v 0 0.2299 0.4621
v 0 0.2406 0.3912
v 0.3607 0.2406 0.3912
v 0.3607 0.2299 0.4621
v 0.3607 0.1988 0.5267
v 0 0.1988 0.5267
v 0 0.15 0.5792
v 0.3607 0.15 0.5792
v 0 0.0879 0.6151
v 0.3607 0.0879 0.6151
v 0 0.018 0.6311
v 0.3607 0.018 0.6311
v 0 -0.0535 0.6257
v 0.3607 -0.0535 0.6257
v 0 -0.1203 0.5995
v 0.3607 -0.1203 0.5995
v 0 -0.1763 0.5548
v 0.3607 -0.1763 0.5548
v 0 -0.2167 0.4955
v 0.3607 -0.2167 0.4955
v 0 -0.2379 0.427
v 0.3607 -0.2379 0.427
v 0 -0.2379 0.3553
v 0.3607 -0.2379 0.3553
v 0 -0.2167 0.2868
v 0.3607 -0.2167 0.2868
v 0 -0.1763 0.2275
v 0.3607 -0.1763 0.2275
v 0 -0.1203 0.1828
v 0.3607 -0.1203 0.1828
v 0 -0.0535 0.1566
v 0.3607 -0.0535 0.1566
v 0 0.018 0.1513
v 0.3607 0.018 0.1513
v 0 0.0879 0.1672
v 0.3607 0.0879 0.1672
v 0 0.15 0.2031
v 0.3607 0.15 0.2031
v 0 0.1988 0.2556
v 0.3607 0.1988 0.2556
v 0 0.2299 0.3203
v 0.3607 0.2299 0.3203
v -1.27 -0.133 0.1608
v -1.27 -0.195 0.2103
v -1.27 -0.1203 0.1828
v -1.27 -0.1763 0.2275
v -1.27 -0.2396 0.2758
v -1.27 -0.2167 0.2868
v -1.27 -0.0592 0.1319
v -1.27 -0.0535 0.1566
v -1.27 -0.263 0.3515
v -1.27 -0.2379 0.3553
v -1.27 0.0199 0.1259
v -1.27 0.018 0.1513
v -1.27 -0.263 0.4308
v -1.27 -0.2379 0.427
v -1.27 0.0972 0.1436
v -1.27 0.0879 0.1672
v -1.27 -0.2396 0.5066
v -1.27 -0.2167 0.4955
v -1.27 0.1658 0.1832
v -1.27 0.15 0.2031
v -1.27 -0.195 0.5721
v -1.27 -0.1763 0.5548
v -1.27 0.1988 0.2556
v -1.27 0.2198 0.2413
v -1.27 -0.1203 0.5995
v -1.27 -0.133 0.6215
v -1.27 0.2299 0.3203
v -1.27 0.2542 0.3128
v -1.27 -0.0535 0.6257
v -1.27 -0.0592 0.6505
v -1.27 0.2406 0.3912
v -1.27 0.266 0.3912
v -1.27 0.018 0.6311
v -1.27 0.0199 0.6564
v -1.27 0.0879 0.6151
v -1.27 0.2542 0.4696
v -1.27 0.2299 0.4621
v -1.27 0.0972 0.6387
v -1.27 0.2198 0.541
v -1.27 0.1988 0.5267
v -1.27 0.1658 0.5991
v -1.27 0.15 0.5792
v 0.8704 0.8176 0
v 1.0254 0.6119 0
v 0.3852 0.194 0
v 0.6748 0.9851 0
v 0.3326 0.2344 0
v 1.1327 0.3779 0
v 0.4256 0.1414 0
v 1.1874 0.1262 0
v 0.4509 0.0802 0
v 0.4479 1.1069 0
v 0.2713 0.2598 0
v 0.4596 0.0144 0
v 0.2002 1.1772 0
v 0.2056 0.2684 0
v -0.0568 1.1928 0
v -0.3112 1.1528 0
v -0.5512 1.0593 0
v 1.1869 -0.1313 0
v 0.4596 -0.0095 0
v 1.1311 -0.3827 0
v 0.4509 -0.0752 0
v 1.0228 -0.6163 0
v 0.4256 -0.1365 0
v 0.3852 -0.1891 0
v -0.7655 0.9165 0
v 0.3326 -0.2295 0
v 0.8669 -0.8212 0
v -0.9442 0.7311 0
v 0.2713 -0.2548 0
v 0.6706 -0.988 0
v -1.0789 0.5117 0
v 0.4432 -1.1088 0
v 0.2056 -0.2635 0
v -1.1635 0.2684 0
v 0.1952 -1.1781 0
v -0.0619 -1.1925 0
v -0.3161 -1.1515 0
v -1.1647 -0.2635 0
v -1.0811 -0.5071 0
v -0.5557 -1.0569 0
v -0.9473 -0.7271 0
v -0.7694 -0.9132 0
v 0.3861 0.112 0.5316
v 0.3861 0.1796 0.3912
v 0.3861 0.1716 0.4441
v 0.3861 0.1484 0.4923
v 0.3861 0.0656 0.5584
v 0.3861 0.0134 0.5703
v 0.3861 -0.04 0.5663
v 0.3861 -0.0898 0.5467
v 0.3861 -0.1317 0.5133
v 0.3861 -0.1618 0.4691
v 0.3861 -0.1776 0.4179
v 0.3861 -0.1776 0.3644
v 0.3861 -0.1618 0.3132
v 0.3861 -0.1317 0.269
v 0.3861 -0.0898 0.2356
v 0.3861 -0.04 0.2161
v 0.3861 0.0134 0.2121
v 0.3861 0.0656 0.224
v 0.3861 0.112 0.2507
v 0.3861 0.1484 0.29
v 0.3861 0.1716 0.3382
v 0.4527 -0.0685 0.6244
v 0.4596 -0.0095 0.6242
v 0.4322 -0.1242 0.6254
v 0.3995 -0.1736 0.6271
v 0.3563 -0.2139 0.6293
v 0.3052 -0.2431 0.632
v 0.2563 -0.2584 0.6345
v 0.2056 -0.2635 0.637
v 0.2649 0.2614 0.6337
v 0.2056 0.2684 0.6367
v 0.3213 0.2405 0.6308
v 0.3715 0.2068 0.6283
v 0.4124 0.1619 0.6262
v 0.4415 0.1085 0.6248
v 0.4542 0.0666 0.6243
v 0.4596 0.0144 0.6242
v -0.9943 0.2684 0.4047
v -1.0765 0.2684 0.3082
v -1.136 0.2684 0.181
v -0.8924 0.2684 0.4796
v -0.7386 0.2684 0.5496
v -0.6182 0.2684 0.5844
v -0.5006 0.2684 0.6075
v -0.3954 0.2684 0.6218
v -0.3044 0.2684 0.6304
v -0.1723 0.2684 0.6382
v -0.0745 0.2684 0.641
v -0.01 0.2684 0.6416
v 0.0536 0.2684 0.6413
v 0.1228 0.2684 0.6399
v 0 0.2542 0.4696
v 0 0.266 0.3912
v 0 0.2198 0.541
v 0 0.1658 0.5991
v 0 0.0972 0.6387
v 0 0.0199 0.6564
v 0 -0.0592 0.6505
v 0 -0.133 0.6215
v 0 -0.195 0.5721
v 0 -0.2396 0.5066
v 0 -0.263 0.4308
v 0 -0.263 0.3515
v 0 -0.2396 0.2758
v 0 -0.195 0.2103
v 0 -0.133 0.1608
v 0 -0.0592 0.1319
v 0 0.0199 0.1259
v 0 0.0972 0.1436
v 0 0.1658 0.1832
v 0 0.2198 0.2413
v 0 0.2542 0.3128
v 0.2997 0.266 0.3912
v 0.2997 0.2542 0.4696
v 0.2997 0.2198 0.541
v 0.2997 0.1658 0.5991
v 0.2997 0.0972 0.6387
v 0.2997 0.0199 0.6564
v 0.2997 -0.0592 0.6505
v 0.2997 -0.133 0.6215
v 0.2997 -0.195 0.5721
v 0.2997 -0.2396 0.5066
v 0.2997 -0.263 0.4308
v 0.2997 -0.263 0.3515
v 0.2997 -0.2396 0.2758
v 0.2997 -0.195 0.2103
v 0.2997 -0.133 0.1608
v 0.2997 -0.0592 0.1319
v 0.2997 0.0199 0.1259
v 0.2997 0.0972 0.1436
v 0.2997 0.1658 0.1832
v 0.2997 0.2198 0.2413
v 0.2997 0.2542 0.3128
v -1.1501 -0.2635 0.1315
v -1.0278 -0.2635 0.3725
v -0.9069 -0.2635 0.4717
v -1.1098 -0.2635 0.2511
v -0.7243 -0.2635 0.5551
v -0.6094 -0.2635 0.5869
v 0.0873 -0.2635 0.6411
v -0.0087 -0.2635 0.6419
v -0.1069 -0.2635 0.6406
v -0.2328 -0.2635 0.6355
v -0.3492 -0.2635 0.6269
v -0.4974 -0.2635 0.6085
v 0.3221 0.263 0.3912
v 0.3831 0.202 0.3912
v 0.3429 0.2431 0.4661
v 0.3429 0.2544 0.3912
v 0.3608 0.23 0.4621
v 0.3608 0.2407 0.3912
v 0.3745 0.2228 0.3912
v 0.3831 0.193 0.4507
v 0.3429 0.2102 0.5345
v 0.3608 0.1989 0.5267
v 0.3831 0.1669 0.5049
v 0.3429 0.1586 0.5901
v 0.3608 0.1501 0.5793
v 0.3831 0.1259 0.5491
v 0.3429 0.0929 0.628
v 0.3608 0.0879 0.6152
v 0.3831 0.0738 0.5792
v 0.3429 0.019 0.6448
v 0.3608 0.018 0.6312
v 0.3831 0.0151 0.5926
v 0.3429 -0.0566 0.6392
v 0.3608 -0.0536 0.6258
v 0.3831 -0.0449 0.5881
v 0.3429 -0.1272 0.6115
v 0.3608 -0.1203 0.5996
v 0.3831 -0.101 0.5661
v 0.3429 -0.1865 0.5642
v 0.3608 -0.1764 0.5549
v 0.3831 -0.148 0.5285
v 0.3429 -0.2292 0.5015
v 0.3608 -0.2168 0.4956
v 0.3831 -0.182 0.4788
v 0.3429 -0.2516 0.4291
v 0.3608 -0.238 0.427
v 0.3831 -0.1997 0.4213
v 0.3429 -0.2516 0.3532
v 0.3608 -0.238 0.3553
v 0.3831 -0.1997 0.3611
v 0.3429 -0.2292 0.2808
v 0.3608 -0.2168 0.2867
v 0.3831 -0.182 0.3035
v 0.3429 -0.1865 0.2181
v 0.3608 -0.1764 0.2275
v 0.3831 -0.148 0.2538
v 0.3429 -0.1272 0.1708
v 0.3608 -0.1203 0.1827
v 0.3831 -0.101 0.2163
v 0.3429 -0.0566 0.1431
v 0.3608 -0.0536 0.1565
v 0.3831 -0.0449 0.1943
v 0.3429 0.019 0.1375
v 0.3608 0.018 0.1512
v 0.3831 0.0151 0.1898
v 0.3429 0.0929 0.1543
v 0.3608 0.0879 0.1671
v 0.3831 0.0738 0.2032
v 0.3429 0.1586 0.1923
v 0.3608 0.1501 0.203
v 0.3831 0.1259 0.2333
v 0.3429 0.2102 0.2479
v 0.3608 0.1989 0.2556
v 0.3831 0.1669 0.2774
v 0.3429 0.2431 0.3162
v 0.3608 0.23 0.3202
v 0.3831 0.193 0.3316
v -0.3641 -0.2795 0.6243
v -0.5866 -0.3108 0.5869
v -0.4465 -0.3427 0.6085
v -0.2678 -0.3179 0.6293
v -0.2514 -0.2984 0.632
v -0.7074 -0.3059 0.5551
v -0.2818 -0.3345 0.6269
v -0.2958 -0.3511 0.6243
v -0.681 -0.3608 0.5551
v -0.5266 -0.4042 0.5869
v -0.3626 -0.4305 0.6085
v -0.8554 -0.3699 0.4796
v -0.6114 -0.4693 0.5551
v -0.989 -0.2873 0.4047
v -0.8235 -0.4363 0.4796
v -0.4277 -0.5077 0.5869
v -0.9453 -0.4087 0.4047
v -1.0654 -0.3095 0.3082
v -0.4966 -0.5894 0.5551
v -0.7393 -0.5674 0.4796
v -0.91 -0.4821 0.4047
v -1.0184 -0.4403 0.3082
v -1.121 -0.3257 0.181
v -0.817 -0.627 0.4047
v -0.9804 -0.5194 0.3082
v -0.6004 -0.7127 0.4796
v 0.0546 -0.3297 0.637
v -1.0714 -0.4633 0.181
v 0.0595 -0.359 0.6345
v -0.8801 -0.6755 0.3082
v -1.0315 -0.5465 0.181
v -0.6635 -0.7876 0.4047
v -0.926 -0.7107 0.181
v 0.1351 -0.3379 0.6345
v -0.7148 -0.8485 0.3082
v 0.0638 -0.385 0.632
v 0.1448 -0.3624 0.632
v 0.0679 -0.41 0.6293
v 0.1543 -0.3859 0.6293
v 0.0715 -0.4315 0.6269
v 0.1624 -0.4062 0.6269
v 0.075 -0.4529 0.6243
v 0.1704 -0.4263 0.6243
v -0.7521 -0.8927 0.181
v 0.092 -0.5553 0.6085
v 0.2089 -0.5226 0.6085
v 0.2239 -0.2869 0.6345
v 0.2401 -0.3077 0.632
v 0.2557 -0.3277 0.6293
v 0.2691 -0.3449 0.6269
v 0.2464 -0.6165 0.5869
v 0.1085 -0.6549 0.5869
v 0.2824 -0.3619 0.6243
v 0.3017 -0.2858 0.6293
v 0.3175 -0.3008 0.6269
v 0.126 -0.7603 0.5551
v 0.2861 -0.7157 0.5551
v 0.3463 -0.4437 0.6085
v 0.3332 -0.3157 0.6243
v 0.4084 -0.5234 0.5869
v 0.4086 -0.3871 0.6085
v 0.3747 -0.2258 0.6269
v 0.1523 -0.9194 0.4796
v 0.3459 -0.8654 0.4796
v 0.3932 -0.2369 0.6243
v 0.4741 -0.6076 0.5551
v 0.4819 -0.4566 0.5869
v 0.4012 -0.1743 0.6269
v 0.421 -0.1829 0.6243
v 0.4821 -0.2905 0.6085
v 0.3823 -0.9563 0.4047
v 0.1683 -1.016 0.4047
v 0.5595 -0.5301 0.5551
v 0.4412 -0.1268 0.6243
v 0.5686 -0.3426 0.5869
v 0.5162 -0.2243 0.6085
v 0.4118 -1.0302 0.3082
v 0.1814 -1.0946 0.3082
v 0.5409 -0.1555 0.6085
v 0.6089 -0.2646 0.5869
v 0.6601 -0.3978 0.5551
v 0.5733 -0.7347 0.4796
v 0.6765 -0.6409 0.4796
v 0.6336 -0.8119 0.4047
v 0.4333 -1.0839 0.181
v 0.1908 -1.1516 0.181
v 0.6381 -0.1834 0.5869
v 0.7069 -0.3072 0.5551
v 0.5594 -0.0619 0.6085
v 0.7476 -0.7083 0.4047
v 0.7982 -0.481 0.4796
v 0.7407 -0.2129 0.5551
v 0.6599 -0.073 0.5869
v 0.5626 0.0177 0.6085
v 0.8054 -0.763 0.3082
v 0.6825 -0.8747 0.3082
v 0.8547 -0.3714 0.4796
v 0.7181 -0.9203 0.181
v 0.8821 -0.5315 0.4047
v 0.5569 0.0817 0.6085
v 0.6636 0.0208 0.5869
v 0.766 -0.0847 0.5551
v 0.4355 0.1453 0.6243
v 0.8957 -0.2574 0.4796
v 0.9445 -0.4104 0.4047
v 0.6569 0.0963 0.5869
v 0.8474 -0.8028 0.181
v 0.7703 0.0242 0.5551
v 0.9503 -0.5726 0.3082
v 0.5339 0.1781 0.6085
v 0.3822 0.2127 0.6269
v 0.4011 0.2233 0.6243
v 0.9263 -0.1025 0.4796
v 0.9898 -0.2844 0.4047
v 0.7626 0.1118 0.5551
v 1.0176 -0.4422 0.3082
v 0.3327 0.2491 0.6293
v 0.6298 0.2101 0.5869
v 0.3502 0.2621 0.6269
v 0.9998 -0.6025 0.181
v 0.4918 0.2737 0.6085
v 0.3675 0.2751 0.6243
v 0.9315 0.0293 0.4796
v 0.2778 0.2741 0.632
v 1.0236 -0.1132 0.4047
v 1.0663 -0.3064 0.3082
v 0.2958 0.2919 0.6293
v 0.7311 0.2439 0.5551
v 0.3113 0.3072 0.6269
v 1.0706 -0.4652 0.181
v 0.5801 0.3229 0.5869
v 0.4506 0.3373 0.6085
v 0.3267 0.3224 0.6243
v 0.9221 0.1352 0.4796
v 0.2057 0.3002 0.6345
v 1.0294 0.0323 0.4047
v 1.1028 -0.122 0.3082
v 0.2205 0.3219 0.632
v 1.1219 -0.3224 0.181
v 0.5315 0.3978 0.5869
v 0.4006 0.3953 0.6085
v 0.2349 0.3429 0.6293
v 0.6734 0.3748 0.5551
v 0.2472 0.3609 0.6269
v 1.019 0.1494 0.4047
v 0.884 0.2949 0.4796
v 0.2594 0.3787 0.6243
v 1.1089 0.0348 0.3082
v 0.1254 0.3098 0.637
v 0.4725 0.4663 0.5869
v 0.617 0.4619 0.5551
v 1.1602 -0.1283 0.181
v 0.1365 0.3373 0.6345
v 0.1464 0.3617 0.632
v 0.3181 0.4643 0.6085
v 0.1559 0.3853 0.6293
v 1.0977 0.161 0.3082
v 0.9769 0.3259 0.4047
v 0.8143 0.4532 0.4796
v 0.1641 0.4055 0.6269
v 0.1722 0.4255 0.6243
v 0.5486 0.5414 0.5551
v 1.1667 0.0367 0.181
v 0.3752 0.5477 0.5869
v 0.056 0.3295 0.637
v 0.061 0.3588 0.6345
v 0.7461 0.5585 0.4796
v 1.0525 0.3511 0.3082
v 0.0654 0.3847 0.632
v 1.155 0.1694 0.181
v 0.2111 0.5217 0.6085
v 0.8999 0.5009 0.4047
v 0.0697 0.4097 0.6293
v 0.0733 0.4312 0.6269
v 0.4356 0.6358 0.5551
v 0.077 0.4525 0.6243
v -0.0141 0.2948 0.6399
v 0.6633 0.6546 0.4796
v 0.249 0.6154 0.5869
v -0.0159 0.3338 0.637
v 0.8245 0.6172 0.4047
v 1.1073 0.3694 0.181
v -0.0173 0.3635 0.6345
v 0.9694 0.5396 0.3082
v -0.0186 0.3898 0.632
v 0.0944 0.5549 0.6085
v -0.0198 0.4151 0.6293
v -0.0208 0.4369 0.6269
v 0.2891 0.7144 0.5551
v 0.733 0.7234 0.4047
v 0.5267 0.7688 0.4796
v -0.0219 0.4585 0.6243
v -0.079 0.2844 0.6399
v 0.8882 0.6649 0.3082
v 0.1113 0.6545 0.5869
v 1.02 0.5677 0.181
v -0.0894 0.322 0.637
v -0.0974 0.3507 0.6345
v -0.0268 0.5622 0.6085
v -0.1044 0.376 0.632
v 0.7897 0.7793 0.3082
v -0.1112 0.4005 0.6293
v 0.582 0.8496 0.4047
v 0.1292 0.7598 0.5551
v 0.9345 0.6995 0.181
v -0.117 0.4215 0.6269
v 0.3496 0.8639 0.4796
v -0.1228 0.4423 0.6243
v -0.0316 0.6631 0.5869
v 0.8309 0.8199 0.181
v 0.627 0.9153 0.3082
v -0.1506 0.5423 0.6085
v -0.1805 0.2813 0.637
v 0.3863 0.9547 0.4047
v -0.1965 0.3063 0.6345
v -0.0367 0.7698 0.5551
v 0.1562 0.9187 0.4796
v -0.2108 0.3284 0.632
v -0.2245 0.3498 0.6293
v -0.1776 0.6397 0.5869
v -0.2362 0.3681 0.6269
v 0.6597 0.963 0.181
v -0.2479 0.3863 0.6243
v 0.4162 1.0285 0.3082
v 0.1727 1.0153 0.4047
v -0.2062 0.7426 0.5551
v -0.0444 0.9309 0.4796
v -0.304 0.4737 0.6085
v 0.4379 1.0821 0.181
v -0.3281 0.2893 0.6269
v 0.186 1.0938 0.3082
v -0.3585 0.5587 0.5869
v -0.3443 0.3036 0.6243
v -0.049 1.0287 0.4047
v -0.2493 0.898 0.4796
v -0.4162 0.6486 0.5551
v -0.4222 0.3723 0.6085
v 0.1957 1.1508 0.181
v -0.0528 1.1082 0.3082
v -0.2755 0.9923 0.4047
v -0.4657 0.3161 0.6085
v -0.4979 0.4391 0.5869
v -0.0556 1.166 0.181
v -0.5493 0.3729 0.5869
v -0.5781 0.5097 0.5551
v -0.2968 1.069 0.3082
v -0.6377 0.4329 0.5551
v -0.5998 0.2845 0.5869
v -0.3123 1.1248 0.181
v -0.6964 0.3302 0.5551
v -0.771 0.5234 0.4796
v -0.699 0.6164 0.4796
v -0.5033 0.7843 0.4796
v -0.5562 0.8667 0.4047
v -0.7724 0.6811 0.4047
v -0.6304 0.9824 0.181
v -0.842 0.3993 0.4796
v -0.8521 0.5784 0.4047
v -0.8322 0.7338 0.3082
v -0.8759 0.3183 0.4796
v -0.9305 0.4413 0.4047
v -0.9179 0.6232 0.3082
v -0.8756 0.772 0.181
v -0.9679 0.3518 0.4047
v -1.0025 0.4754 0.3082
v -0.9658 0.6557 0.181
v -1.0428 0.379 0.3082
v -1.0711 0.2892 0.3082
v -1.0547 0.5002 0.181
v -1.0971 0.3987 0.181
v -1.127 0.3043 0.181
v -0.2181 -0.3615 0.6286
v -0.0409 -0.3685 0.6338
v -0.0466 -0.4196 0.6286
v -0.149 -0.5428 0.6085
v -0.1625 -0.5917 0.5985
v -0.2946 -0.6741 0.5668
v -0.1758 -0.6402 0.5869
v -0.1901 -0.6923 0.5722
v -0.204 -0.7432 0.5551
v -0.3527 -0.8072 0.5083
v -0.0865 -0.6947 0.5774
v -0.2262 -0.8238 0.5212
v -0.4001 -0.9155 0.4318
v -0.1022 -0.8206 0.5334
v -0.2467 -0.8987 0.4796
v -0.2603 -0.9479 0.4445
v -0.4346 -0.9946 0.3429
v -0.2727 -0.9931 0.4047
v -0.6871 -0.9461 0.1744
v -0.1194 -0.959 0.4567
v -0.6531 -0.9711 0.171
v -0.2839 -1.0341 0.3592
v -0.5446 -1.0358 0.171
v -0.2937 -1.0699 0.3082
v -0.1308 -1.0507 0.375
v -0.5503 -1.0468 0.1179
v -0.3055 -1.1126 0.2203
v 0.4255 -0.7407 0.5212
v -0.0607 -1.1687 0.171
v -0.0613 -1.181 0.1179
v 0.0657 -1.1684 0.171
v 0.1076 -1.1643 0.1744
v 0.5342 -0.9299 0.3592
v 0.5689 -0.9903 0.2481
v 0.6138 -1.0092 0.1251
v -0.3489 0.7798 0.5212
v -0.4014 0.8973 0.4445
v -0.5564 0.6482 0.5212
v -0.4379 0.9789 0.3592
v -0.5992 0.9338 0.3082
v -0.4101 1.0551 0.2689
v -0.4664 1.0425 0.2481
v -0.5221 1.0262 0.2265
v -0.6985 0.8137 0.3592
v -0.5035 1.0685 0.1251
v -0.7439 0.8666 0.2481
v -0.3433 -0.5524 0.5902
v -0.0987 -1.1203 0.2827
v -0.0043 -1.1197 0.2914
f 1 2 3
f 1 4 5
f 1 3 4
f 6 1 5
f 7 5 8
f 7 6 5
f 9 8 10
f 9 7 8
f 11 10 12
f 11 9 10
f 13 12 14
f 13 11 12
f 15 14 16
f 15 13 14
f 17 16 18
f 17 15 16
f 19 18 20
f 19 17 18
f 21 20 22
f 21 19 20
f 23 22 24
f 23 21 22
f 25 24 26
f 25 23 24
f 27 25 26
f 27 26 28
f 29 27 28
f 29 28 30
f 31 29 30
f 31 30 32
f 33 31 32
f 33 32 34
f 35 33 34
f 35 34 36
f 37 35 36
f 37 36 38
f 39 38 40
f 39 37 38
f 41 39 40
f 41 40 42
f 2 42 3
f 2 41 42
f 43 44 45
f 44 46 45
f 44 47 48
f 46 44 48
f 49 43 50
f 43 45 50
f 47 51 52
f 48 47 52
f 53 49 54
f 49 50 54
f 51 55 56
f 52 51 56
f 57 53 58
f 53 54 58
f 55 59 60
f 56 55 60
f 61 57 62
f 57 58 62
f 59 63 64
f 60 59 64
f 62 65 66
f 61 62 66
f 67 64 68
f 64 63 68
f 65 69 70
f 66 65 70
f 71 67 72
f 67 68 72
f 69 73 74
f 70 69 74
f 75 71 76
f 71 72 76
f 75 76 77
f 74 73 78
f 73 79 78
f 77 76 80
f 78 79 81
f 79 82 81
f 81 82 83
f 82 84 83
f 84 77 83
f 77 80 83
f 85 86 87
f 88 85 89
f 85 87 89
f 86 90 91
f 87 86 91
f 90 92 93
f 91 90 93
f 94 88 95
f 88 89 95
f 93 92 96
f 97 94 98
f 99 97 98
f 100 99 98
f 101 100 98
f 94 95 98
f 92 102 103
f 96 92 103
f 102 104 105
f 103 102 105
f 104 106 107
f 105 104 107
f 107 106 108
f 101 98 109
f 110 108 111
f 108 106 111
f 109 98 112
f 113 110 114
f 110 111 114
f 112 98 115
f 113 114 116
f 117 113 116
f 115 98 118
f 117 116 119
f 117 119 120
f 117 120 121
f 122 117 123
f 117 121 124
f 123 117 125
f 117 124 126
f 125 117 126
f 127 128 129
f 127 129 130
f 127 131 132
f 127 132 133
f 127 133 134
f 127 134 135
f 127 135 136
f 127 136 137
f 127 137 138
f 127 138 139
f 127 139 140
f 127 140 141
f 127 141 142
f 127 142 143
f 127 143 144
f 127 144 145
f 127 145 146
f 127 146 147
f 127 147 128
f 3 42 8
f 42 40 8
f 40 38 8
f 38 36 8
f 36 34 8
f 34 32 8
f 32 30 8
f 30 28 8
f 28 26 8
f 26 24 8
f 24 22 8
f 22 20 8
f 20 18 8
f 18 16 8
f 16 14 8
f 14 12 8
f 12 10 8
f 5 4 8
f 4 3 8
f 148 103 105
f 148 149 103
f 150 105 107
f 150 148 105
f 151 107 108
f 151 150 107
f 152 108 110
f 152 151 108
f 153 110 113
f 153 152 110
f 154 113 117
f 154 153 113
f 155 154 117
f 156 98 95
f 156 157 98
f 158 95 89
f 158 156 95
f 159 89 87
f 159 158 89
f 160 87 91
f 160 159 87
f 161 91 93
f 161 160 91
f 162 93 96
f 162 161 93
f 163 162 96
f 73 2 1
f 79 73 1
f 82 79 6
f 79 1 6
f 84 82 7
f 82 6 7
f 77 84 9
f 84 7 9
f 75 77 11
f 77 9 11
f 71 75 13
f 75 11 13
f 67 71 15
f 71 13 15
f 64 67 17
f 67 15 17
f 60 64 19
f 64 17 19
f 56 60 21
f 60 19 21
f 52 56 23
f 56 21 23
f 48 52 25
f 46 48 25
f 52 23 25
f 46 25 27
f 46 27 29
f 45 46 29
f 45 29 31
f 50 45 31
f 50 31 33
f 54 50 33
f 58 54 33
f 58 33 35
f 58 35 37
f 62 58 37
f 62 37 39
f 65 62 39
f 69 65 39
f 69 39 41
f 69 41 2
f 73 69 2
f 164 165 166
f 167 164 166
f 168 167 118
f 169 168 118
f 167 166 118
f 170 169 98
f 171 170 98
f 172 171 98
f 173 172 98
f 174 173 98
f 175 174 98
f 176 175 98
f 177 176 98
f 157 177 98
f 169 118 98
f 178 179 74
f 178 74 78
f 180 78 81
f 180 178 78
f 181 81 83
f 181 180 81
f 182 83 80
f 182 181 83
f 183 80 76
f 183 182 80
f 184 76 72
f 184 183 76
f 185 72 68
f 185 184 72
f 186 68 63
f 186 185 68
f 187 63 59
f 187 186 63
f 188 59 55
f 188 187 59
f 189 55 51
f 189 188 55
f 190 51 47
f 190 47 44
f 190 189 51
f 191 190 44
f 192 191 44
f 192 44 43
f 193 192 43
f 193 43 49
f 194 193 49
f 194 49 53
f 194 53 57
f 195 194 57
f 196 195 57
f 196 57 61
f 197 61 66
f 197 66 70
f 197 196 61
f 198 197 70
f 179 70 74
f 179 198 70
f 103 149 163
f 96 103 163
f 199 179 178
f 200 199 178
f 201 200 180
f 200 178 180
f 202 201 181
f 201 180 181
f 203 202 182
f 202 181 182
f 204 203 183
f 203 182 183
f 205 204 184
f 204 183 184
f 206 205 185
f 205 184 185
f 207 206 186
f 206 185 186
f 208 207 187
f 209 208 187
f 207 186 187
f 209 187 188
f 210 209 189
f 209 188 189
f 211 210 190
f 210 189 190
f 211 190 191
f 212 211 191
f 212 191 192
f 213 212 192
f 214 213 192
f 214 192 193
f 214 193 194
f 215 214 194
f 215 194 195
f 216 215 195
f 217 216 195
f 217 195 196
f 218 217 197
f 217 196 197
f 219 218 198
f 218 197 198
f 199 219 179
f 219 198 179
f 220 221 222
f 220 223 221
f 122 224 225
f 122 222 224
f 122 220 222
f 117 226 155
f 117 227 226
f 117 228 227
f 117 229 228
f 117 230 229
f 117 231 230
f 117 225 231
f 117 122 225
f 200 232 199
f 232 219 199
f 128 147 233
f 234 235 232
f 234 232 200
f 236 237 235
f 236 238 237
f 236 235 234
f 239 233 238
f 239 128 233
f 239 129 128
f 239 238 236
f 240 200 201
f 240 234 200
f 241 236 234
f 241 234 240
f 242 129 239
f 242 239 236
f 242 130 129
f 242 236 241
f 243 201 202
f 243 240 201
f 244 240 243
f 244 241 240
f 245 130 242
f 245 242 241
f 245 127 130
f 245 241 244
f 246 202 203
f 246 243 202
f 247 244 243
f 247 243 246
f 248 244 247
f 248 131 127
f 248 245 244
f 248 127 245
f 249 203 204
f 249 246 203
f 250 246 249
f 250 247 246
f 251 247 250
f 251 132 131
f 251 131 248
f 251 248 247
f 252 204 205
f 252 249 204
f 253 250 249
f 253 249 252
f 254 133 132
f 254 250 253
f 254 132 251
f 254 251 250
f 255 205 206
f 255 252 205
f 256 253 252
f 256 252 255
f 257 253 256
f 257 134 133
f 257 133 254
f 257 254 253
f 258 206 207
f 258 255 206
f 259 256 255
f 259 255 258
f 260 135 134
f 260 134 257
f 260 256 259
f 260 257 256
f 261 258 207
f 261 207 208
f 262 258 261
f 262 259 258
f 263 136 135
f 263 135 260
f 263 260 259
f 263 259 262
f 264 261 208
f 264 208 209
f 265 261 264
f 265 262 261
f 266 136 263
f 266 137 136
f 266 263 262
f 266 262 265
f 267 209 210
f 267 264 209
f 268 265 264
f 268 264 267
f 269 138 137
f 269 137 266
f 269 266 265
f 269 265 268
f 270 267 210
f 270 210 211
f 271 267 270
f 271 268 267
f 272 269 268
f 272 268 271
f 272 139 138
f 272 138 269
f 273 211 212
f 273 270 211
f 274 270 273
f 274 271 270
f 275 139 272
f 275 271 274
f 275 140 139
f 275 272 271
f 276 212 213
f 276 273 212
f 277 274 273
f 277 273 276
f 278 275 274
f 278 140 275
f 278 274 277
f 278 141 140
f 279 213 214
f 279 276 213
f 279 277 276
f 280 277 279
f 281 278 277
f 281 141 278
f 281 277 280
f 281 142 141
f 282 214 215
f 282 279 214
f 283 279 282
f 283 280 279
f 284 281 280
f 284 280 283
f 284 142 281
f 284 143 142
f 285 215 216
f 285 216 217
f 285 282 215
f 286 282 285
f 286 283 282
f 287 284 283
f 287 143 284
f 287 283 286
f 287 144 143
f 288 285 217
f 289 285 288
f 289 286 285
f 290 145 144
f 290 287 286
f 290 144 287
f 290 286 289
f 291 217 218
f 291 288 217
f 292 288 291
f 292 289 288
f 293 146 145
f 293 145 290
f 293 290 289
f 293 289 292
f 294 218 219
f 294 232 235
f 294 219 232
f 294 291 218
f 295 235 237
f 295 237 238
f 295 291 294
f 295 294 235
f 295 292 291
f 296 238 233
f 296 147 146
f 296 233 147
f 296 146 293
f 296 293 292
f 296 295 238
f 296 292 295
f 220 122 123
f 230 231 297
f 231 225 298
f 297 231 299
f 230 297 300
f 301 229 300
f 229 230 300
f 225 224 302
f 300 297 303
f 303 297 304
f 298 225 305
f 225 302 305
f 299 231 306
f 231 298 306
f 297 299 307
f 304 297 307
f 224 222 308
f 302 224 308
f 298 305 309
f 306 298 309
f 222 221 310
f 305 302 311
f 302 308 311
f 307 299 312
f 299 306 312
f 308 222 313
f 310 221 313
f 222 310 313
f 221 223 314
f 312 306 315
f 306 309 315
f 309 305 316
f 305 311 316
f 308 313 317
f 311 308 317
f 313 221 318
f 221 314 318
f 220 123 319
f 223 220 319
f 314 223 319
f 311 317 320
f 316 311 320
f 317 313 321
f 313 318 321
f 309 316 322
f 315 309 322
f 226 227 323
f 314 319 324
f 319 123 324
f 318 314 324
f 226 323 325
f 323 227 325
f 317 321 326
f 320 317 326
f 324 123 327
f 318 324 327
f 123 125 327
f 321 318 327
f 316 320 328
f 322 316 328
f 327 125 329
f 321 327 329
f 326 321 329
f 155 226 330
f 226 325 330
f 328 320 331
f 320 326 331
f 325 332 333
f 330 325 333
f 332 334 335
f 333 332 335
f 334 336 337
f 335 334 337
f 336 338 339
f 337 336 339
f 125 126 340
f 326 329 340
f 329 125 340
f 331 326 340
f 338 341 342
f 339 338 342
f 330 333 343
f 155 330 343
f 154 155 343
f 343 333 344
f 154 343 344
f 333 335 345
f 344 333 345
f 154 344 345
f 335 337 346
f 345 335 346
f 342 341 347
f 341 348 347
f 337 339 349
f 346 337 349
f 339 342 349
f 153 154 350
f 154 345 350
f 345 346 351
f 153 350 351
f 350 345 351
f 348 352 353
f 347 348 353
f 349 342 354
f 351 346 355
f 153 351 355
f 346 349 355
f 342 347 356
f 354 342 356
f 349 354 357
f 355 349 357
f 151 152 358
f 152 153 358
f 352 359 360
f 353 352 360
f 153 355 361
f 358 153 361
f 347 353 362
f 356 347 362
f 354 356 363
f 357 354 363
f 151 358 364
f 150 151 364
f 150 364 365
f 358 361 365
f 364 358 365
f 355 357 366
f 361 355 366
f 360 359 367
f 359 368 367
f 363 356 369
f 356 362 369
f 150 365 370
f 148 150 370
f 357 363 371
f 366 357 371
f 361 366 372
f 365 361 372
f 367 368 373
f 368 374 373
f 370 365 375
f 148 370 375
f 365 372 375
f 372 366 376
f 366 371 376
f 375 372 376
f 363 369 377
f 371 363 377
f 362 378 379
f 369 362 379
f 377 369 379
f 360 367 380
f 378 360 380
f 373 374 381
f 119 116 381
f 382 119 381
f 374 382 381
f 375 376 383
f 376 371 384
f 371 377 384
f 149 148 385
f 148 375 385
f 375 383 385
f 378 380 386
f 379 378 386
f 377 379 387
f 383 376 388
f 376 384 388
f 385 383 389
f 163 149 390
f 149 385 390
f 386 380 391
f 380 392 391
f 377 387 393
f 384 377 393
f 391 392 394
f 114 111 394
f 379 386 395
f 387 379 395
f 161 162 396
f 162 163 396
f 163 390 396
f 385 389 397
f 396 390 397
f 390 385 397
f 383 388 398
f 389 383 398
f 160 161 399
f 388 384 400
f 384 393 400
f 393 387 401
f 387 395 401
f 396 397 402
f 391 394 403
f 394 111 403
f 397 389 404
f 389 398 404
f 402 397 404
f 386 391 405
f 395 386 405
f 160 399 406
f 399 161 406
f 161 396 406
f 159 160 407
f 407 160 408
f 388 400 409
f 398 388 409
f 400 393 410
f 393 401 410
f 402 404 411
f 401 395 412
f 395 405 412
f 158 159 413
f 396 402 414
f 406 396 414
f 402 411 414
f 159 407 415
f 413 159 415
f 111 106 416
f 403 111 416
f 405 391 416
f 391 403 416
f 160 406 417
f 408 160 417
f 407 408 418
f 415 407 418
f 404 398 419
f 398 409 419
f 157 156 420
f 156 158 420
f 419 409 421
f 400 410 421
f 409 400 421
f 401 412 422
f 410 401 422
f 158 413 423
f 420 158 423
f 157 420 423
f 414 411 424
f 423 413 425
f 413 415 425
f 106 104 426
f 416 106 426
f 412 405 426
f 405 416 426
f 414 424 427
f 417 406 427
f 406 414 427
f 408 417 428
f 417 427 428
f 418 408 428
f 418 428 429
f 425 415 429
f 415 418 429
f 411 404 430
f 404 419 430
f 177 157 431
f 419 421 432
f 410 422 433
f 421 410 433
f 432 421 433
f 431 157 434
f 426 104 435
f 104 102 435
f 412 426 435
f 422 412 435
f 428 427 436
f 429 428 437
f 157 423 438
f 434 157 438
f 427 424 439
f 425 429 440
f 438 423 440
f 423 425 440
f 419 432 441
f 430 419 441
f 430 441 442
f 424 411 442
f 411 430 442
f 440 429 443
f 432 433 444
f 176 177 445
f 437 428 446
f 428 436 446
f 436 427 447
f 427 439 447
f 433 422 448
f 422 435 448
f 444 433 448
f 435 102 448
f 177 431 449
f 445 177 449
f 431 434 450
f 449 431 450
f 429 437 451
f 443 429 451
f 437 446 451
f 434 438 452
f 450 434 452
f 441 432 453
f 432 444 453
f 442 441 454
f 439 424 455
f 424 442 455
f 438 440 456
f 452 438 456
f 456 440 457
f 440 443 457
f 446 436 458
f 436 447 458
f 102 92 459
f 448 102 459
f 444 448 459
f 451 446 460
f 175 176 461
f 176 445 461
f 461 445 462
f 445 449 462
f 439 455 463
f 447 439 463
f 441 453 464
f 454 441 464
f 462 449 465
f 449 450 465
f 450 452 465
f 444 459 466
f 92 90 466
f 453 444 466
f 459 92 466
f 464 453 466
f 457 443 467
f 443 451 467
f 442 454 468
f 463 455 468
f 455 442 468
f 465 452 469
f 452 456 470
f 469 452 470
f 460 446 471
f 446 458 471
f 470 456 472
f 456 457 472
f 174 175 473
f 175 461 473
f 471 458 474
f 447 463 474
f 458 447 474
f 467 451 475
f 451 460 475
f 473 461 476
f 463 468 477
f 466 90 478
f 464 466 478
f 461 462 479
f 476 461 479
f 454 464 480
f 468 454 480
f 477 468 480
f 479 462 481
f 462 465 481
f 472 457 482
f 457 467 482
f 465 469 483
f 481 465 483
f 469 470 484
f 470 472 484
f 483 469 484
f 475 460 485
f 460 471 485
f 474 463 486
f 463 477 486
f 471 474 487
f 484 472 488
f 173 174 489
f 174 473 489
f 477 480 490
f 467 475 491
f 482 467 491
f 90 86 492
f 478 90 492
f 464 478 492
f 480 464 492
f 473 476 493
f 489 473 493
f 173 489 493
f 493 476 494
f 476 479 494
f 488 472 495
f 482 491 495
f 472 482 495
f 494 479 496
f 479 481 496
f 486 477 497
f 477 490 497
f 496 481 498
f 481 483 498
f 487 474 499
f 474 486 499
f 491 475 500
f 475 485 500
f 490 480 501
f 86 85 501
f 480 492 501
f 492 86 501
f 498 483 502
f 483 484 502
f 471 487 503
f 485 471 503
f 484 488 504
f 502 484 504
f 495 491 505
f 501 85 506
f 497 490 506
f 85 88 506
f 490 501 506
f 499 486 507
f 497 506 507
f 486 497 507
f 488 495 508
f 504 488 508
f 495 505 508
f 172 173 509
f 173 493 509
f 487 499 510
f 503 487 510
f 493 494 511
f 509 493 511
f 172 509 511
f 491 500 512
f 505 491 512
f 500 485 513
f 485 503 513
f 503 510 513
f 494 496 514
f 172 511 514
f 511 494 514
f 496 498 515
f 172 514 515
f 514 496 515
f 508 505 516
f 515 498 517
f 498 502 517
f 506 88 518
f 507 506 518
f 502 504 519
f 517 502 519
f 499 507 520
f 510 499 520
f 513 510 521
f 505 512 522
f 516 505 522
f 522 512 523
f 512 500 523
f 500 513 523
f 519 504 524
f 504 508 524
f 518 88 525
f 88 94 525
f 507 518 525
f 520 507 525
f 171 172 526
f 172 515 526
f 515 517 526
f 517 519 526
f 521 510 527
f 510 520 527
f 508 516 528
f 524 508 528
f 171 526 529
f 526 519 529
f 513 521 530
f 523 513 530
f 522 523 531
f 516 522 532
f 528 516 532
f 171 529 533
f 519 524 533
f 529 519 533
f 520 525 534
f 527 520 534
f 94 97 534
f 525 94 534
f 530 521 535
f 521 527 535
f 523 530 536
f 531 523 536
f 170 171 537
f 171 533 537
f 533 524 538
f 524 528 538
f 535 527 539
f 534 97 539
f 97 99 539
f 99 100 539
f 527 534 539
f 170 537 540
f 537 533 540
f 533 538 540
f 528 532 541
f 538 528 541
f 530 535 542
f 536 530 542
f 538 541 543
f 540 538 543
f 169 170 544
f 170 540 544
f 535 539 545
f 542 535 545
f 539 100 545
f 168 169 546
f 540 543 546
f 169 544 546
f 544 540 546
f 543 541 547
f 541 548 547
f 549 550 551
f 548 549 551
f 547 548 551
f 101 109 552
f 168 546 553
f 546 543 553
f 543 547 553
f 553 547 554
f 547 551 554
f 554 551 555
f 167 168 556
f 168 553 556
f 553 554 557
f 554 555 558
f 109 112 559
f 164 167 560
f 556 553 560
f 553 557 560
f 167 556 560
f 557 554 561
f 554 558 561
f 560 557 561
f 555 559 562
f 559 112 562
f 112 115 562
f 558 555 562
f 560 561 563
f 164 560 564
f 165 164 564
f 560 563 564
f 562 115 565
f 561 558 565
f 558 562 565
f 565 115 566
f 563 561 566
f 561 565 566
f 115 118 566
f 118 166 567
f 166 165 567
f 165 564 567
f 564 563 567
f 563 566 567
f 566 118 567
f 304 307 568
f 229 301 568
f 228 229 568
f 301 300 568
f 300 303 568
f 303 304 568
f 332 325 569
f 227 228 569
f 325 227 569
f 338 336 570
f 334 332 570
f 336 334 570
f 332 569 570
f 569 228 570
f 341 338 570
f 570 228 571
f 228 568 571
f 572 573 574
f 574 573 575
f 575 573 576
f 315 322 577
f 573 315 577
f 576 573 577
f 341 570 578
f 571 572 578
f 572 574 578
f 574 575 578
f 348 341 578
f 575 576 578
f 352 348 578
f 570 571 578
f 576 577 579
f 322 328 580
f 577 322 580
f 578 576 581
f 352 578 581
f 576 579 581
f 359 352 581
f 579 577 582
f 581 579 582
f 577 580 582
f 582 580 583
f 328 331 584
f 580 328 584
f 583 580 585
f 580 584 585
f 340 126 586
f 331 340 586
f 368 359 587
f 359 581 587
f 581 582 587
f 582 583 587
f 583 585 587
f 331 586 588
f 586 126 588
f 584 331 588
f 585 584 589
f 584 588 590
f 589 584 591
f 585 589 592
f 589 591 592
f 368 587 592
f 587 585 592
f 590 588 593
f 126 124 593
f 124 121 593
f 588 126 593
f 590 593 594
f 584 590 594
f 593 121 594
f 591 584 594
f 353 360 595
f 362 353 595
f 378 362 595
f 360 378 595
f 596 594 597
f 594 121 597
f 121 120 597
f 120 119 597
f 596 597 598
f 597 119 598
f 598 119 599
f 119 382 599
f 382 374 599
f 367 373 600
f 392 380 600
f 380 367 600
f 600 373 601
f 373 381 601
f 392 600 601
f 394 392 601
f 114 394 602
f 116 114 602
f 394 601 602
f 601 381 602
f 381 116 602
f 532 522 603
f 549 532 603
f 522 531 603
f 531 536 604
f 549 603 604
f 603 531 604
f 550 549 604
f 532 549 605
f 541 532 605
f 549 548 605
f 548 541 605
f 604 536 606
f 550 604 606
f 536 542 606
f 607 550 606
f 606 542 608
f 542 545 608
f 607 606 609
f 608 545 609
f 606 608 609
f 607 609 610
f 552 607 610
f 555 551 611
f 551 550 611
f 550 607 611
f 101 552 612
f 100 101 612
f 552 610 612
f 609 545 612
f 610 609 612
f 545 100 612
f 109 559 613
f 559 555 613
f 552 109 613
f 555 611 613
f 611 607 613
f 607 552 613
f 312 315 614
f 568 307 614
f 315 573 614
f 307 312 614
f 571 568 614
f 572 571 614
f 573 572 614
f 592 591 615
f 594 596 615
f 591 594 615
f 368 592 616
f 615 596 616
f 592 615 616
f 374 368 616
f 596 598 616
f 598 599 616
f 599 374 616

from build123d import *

# Parameters (mm, degrees)
F2_W          = 1.9304
F2_H          = 0.5319268
F3_DEPTH      = 1.2954
F4_R          = 0.254
F5_R          = 0.265968525
F6_DEPTH      = 1.27
F6_DEPTH_BACK = 0.38608
F7_T          = -0.0254
F8_R          = 0.08636


with BuildPart() as f1:
    # F0 (on Front) → F1 (revolve)
    with BuildSketch(Plane.XZ):
        with BuildLine():
            Line((0, 0), (0, 0.6544719217))
            add(Edge.make_bspline(
                [(0, 0.6544719217), (-0.3825341118, 0.633114716), (-1.1825968977, 0.6597214378), (-1.1941111879, 0)],
                knots=[0, 0, 0, 0, 1.3617029873, 1.3617029873, 1.3617029873, 1.3617029873], degree=3))
            Line((-1.1941111879, 0), (0, 0))
        make_face()
    revolve(axis=Axis((0, 0, 0.3272359609), (0, 0, 1)))

    # F2 (on Top) → F3 (cut)
    with BuildSketch(Plane.XY):
        with Locations((-0.5055966453, 0.0024771143)):
            Rectangle(F2_W, F2_H)
    extrude(amount=F3_DEPTH, mode=Mode.SUBTRACT)

    # F4
    f4_edges = [f1.edges().sort_by_distance(p)[0] for p in [
        (0.459603, 0.268441, 0.306859),
        (0.459603, -0.263486, 0.30706),
    ]]
    fillet(f4_edges, radius=F4_R)


with BuildPart() as f6:
    # F5 (on Right) → F6 (new body, two sides)
    with BuildSketch(Plane.YZ) as f6_sk:
        with Locations((0, 0.3911597887)):
            Circle(F5_R)
    extrude(amount=-F6_DEPTH)
    extrude(f6_sk.sketch, amount=F6_DEPTH_BACK)

    # F7
    f7_openings = [f6.faces().sort_by_distance(p)[0] for p in [
        (-1.27, 0, 0.39116),
    ]]
    offset(amount=F7_T, openings=f7_openings)

    # F8
    f8_edges = [f6.edges().sort_by_distance(p)[0] for p in [
        (0.38608, -0.265969, 0.39116),
    ]]
    fillet(f8_edges, radius=F8_R)


solid = Compound([f1.part, f6.part])
